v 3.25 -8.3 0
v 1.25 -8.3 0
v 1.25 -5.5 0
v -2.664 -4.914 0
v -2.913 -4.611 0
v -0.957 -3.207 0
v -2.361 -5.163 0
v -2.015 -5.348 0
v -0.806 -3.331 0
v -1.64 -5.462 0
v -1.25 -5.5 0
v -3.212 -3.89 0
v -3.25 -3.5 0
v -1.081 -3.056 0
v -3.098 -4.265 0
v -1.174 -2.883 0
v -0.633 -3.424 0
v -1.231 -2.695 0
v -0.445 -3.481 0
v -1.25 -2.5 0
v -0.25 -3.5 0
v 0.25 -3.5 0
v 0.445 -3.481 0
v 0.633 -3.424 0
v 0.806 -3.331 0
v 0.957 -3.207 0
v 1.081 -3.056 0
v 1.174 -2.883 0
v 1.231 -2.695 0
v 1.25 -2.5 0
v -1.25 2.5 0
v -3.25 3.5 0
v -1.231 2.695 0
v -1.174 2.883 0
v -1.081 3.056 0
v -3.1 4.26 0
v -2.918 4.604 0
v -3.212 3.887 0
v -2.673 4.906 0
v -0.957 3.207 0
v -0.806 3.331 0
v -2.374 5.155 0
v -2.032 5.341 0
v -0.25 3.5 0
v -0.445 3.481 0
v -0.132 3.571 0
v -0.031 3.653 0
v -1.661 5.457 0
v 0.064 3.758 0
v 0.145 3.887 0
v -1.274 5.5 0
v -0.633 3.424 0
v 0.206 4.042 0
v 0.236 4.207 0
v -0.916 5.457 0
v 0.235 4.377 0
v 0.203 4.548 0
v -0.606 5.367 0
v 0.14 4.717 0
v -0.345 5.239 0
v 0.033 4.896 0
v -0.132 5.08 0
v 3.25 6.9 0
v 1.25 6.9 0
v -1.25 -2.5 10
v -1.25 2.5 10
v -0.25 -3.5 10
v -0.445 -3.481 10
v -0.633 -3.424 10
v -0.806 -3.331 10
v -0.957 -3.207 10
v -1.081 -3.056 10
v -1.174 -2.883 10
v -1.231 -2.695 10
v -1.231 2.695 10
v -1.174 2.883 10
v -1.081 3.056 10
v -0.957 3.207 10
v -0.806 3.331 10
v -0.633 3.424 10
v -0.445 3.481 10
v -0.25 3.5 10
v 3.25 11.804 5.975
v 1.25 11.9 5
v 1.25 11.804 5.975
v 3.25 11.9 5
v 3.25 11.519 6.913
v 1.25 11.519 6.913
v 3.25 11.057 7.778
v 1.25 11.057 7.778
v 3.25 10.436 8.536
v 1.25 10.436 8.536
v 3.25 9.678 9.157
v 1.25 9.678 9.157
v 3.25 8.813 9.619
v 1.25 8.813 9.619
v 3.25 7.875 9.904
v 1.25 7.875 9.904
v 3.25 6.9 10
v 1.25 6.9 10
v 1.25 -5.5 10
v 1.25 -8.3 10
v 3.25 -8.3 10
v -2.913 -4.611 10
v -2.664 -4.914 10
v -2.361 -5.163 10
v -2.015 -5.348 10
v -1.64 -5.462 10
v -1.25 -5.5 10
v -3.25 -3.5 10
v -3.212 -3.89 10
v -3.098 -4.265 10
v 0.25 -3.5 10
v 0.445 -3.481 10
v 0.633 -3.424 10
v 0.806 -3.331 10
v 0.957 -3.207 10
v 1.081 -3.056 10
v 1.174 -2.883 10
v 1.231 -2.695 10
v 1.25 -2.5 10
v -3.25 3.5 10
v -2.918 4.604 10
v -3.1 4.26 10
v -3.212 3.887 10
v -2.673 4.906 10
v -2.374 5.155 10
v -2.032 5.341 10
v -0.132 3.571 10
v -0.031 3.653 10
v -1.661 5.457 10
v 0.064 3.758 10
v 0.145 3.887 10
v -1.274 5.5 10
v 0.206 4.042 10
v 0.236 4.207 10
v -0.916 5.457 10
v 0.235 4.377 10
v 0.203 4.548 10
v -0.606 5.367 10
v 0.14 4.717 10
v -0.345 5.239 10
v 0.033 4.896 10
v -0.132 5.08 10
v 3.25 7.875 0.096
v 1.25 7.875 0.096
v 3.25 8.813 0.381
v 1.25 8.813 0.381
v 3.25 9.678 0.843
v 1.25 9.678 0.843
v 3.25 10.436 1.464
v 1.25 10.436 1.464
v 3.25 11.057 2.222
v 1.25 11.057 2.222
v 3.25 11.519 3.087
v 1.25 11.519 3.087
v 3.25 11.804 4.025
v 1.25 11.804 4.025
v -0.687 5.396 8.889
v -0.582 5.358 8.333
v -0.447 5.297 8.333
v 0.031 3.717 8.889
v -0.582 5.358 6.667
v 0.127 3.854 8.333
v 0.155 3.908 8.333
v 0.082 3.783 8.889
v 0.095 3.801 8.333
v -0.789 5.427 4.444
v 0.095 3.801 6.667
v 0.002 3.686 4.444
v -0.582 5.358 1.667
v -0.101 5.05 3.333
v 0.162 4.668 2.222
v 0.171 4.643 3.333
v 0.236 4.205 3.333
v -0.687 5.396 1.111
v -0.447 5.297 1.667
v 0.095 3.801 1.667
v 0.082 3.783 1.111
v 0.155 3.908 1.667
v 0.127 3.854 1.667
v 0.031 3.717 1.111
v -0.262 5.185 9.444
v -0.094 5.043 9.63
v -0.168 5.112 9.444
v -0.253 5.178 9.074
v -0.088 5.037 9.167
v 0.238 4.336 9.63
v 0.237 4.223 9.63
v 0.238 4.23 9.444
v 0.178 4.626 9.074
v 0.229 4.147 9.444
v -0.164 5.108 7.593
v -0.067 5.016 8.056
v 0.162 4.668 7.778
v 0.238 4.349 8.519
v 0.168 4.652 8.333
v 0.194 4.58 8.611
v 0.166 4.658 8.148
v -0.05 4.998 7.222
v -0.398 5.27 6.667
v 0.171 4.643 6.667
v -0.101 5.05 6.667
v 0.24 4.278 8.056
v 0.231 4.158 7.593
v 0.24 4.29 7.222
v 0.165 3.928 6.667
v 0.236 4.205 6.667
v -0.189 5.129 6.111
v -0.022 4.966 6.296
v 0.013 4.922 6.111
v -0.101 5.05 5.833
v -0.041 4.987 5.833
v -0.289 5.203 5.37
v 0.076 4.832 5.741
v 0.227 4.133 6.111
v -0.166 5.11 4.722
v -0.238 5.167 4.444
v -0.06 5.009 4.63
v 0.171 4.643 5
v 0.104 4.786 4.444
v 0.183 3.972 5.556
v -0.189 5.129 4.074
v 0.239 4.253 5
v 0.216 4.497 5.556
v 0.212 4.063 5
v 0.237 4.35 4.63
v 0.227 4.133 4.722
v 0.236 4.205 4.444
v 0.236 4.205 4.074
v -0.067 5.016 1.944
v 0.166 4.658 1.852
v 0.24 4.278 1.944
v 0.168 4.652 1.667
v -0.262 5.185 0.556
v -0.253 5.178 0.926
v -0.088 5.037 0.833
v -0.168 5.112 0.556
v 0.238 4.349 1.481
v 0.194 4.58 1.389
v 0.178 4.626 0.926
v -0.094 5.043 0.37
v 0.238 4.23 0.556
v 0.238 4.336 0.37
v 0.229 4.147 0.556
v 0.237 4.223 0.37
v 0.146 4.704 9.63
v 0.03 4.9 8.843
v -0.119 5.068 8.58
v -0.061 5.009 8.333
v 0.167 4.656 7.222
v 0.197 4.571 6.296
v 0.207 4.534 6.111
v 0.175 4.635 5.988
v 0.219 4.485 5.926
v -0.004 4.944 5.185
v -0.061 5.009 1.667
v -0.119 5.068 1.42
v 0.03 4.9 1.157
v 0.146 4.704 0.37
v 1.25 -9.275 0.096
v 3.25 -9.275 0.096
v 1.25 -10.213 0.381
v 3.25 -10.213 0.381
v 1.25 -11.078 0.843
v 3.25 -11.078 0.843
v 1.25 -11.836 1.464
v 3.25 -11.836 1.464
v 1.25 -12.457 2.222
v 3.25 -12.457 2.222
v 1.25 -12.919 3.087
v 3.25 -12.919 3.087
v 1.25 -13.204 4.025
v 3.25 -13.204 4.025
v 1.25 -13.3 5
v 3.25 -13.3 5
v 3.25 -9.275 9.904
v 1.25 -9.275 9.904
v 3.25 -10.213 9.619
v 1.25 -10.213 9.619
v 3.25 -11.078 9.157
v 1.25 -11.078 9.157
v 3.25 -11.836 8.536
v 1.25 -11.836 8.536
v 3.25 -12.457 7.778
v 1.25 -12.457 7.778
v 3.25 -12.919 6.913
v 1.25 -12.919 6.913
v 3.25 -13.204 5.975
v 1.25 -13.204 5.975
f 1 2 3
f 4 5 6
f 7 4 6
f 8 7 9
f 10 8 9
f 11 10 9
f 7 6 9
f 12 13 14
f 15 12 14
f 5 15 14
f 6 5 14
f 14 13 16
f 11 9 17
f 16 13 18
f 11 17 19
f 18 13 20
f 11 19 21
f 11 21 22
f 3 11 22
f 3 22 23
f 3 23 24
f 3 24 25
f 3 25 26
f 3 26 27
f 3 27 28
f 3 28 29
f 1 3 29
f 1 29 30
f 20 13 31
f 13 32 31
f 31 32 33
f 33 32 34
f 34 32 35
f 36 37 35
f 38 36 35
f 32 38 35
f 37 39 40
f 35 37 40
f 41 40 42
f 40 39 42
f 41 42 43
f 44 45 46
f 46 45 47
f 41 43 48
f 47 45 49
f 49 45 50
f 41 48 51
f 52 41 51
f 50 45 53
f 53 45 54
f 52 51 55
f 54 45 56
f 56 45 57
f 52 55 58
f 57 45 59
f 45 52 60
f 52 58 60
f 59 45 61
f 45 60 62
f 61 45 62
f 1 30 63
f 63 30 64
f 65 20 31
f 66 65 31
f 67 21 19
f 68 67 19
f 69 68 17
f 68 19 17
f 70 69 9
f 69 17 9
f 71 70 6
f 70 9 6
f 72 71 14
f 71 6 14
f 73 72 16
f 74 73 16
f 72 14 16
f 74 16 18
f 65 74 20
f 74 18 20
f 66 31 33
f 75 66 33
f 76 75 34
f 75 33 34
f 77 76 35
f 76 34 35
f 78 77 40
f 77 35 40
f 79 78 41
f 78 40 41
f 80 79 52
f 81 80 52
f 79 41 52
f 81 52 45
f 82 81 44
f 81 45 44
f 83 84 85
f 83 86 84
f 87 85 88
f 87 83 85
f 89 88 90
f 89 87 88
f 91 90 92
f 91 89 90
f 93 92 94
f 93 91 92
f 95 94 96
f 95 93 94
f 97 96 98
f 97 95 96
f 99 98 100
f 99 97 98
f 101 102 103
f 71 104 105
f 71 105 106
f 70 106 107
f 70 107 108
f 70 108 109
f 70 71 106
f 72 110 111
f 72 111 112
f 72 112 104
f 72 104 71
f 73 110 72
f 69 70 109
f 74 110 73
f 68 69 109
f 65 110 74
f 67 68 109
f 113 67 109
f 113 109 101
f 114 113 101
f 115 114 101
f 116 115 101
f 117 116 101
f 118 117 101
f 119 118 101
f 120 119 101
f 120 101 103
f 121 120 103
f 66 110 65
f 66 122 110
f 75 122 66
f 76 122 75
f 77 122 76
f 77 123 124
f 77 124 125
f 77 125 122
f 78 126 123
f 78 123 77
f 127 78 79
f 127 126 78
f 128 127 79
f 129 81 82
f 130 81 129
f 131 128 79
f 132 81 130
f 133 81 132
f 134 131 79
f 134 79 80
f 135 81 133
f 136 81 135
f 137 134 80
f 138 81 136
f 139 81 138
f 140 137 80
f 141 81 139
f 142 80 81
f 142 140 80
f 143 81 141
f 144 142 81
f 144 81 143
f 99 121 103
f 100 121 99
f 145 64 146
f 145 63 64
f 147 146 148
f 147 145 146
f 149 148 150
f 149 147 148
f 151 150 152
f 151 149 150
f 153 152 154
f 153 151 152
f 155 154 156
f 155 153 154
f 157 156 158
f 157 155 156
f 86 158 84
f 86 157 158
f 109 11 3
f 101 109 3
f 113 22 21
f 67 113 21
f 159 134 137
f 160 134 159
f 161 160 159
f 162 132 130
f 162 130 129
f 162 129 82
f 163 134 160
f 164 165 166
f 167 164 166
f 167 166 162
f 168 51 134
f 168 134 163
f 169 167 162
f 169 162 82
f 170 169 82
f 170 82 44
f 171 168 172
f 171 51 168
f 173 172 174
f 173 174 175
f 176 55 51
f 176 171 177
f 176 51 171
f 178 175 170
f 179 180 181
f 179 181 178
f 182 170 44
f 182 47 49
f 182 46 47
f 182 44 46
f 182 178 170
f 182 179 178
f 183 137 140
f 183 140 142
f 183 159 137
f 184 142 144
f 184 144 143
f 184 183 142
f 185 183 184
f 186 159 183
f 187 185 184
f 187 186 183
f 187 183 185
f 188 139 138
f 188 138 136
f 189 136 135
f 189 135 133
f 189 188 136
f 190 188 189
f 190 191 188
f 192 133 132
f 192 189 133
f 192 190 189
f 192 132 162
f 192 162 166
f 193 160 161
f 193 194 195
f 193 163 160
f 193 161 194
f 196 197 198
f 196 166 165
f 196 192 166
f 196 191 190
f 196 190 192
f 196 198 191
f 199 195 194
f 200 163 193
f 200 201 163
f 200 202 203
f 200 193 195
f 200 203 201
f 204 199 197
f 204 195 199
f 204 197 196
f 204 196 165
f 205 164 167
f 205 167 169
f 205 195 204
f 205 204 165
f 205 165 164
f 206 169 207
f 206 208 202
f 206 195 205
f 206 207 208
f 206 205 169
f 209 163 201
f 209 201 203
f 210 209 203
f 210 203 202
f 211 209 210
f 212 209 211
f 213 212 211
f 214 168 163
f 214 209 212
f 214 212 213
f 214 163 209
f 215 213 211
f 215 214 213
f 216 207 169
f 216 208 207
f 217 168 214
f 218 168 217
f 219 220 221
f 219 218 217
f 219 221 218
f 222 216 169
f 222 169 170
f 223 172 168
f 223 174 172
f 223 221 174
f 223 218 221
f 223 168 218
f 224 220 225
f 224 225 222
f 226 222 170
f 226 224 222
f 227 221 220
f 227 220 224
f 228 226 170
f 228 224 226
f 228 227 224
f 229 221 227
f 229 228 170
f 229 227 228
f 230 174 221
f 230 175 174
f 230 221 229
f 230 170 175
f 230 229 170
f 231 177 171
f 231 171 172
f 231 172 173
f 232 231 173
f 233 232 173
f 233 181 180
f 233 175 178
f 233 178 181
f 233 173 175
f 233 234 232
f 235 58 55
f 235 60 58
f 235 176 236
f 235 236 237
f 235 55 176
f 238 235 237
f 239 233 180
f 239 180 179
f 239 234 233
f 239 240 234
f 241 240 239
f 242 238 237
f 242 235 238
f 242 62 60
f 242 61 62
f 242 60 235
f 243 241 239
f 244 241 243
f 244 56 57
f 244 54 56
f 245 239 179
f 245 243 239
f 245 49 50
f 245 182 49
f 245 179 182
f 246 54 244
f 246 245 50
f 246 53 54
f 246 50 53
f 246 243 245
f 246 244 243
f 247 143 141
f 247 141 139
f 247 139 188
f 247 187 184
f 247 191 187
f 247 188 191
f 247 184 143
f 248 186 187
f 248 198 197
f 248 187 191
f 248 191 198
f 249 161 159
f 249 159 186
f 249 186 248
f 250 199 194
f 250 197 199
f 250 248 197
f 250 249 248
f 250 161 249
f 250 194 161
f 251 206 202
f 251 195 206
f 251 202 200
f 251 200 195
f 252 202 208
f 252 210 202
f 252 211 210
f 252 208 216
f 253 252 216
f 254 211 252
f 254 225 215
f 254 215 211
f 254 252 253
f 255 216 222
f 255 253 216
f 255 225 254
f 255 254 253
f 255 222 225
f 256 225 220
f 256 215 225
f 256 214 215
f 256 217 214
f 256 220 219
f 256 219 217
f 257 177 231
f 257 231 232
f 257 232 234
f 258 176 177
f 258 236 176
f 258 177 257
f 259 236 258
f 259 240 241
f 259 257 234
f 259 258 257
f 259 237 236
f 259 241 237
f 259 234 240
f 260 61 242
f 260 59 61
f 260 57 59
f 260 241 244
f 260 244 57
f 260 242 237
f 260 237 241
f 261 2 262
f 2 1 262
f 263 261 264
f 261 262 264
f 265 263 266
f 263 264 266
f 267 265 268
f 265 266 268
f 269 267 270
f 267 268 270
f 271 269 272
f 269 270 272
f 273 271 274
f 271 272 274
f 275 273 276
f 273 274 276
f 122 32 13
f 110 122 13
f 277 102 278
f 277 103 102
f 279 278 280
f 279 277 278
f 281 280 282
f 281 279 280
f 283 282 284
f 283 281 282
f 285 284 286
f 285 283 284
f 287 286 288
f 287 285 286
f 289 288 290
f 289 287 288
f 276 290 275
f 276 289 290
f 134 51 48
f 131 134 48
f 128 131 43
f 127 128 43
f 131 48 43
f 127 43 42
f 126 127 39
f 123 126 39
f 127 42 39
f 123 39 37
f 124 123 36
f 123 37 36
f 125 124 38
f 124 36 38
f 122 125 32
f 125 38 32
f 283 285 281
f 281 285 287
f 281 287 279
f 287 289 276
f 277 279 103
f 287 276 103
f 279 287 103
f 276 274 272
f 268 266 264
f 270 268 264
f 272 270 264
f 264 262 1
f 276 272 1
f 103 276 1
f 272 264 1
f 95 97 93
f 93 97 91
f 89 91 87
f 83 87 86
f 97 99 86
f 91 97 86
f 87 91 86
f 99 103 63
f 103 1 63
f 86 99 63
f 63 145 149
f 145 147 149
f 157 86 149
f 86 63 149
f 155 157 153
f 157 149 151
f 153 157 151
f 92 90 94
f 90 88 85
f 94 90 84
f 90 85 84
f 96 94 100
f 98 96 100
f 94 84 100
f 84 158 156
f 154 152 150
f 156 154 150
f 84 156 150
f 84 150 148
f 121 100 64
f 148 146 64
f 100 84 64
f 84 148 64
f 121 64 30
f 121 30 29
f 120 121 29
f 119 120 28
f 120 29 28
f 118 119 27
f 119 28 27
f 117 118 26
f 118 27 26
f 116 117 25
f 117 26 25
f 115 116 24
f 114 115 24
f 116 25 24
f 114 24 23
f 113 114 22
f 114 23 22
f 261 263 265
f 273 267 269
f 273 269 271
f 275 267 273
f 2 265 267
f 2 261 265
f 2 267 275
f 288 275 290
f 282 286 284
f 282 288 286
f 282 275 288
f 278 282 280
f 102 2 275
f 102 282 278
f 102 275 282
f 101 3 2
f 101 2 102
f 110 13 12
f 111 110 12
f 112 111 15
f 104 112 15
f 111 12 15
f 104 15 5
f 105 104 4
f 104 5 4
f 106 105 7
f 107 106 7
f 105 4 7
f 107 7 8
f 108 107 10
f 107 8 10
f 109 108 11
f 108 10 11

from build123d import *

# Parameters (mm, degrees)
F1_DEPTH      = 10
F2_W          = 2
F2_H          = 10
F3_DEPTH      = 13.3
F3_DEPTH_BACK = 11.9
F4_R          = 4.99999


# Not quite as in the source:
# - a fillet or chamfer is up to 0.001 mm smaller than in the source, because OpenCascade refuses the exact size


with BuildPart() as f1:
    # F0 (on Top) → F1 (new body)
    with BuildSketch(Plane.XY):
        with BuildLine():
            Line((-1.25, -5.5), (3.25, -5.5))
            Line((3.25, -5.5), (3.25, 3.499999999))
            ThreePointArc((3.25, 3.499999999), (2.2500000005, 4.499999999), (1.25, 3.5))
            Line((1.25, 3.5), (1.25, -2.5))
            ThreePointArc((1.25, -2.5), (0.9571067812, -3.2071067812), (0.25, -3.5))
            Line((0.25, -3.5), (-0.25, -3.5))
            ThreePointArc((-0.25, -3.5), (-0.9571067812, -3.2071067812), (-1.25, -2.5))
            Line((-1.25, -2.5), (-1.25, 2.5))
            ThreePointArc((-1.25, 2.5), (-0.9571067812, 3.2071067812), (-0.25, 3.5))
            add(Edge.make_bspline(
                [(-1.2744928417, 5.5), (0.3231141309, 5.4264482222), (0.6423479063, 3.9560622536), (-0.25, 3.5)],
                knots=[0, 0, 0, 0, 2.2471282969, 2.2471282969, 2.2471282969, 2.2471282969], degree=3))
            ThreePointArc((-1.2744928417, 5.5), (-2.6728467387, 4.9056773399), (-3.25, 3.5001499804))
            Line((-3.25, 3.5001499804), (-3.25, -3.5))
            ThreePointArc((-3.25, -3.5), (-2.6642135624, -4.9142135624), (-1.25, -5.5))
        make_face()
    extrude(amount=F1_DEPTH)

    # F2 (on Front) → F3 (join, two sides)
    with BuildSketch(Plane.XZ) as f3_sk:
        with Locations((2.25, 5)):
            Rectangle(F2_W, F2_H)
    extrude(amount=F3_DEPTH)
    extrude(f3_sk.sketch, amount=-F3_DEPTH_BACK)

    # F4 (radius 5 in the source; OpenCascade refuses exactly that, so slightly less here)
    f4_edges = [f1.edges().sort_by_distance(p)[0] for p in [
        (2.25, -13.3, 10),
        (2.25, 11.9, 10),
        (2.25, -13.3, 0),
        (2.25, 11.9, 0),
    ]]
    fillet(f4_edges, radius=F4_R)


solid = f1.part
